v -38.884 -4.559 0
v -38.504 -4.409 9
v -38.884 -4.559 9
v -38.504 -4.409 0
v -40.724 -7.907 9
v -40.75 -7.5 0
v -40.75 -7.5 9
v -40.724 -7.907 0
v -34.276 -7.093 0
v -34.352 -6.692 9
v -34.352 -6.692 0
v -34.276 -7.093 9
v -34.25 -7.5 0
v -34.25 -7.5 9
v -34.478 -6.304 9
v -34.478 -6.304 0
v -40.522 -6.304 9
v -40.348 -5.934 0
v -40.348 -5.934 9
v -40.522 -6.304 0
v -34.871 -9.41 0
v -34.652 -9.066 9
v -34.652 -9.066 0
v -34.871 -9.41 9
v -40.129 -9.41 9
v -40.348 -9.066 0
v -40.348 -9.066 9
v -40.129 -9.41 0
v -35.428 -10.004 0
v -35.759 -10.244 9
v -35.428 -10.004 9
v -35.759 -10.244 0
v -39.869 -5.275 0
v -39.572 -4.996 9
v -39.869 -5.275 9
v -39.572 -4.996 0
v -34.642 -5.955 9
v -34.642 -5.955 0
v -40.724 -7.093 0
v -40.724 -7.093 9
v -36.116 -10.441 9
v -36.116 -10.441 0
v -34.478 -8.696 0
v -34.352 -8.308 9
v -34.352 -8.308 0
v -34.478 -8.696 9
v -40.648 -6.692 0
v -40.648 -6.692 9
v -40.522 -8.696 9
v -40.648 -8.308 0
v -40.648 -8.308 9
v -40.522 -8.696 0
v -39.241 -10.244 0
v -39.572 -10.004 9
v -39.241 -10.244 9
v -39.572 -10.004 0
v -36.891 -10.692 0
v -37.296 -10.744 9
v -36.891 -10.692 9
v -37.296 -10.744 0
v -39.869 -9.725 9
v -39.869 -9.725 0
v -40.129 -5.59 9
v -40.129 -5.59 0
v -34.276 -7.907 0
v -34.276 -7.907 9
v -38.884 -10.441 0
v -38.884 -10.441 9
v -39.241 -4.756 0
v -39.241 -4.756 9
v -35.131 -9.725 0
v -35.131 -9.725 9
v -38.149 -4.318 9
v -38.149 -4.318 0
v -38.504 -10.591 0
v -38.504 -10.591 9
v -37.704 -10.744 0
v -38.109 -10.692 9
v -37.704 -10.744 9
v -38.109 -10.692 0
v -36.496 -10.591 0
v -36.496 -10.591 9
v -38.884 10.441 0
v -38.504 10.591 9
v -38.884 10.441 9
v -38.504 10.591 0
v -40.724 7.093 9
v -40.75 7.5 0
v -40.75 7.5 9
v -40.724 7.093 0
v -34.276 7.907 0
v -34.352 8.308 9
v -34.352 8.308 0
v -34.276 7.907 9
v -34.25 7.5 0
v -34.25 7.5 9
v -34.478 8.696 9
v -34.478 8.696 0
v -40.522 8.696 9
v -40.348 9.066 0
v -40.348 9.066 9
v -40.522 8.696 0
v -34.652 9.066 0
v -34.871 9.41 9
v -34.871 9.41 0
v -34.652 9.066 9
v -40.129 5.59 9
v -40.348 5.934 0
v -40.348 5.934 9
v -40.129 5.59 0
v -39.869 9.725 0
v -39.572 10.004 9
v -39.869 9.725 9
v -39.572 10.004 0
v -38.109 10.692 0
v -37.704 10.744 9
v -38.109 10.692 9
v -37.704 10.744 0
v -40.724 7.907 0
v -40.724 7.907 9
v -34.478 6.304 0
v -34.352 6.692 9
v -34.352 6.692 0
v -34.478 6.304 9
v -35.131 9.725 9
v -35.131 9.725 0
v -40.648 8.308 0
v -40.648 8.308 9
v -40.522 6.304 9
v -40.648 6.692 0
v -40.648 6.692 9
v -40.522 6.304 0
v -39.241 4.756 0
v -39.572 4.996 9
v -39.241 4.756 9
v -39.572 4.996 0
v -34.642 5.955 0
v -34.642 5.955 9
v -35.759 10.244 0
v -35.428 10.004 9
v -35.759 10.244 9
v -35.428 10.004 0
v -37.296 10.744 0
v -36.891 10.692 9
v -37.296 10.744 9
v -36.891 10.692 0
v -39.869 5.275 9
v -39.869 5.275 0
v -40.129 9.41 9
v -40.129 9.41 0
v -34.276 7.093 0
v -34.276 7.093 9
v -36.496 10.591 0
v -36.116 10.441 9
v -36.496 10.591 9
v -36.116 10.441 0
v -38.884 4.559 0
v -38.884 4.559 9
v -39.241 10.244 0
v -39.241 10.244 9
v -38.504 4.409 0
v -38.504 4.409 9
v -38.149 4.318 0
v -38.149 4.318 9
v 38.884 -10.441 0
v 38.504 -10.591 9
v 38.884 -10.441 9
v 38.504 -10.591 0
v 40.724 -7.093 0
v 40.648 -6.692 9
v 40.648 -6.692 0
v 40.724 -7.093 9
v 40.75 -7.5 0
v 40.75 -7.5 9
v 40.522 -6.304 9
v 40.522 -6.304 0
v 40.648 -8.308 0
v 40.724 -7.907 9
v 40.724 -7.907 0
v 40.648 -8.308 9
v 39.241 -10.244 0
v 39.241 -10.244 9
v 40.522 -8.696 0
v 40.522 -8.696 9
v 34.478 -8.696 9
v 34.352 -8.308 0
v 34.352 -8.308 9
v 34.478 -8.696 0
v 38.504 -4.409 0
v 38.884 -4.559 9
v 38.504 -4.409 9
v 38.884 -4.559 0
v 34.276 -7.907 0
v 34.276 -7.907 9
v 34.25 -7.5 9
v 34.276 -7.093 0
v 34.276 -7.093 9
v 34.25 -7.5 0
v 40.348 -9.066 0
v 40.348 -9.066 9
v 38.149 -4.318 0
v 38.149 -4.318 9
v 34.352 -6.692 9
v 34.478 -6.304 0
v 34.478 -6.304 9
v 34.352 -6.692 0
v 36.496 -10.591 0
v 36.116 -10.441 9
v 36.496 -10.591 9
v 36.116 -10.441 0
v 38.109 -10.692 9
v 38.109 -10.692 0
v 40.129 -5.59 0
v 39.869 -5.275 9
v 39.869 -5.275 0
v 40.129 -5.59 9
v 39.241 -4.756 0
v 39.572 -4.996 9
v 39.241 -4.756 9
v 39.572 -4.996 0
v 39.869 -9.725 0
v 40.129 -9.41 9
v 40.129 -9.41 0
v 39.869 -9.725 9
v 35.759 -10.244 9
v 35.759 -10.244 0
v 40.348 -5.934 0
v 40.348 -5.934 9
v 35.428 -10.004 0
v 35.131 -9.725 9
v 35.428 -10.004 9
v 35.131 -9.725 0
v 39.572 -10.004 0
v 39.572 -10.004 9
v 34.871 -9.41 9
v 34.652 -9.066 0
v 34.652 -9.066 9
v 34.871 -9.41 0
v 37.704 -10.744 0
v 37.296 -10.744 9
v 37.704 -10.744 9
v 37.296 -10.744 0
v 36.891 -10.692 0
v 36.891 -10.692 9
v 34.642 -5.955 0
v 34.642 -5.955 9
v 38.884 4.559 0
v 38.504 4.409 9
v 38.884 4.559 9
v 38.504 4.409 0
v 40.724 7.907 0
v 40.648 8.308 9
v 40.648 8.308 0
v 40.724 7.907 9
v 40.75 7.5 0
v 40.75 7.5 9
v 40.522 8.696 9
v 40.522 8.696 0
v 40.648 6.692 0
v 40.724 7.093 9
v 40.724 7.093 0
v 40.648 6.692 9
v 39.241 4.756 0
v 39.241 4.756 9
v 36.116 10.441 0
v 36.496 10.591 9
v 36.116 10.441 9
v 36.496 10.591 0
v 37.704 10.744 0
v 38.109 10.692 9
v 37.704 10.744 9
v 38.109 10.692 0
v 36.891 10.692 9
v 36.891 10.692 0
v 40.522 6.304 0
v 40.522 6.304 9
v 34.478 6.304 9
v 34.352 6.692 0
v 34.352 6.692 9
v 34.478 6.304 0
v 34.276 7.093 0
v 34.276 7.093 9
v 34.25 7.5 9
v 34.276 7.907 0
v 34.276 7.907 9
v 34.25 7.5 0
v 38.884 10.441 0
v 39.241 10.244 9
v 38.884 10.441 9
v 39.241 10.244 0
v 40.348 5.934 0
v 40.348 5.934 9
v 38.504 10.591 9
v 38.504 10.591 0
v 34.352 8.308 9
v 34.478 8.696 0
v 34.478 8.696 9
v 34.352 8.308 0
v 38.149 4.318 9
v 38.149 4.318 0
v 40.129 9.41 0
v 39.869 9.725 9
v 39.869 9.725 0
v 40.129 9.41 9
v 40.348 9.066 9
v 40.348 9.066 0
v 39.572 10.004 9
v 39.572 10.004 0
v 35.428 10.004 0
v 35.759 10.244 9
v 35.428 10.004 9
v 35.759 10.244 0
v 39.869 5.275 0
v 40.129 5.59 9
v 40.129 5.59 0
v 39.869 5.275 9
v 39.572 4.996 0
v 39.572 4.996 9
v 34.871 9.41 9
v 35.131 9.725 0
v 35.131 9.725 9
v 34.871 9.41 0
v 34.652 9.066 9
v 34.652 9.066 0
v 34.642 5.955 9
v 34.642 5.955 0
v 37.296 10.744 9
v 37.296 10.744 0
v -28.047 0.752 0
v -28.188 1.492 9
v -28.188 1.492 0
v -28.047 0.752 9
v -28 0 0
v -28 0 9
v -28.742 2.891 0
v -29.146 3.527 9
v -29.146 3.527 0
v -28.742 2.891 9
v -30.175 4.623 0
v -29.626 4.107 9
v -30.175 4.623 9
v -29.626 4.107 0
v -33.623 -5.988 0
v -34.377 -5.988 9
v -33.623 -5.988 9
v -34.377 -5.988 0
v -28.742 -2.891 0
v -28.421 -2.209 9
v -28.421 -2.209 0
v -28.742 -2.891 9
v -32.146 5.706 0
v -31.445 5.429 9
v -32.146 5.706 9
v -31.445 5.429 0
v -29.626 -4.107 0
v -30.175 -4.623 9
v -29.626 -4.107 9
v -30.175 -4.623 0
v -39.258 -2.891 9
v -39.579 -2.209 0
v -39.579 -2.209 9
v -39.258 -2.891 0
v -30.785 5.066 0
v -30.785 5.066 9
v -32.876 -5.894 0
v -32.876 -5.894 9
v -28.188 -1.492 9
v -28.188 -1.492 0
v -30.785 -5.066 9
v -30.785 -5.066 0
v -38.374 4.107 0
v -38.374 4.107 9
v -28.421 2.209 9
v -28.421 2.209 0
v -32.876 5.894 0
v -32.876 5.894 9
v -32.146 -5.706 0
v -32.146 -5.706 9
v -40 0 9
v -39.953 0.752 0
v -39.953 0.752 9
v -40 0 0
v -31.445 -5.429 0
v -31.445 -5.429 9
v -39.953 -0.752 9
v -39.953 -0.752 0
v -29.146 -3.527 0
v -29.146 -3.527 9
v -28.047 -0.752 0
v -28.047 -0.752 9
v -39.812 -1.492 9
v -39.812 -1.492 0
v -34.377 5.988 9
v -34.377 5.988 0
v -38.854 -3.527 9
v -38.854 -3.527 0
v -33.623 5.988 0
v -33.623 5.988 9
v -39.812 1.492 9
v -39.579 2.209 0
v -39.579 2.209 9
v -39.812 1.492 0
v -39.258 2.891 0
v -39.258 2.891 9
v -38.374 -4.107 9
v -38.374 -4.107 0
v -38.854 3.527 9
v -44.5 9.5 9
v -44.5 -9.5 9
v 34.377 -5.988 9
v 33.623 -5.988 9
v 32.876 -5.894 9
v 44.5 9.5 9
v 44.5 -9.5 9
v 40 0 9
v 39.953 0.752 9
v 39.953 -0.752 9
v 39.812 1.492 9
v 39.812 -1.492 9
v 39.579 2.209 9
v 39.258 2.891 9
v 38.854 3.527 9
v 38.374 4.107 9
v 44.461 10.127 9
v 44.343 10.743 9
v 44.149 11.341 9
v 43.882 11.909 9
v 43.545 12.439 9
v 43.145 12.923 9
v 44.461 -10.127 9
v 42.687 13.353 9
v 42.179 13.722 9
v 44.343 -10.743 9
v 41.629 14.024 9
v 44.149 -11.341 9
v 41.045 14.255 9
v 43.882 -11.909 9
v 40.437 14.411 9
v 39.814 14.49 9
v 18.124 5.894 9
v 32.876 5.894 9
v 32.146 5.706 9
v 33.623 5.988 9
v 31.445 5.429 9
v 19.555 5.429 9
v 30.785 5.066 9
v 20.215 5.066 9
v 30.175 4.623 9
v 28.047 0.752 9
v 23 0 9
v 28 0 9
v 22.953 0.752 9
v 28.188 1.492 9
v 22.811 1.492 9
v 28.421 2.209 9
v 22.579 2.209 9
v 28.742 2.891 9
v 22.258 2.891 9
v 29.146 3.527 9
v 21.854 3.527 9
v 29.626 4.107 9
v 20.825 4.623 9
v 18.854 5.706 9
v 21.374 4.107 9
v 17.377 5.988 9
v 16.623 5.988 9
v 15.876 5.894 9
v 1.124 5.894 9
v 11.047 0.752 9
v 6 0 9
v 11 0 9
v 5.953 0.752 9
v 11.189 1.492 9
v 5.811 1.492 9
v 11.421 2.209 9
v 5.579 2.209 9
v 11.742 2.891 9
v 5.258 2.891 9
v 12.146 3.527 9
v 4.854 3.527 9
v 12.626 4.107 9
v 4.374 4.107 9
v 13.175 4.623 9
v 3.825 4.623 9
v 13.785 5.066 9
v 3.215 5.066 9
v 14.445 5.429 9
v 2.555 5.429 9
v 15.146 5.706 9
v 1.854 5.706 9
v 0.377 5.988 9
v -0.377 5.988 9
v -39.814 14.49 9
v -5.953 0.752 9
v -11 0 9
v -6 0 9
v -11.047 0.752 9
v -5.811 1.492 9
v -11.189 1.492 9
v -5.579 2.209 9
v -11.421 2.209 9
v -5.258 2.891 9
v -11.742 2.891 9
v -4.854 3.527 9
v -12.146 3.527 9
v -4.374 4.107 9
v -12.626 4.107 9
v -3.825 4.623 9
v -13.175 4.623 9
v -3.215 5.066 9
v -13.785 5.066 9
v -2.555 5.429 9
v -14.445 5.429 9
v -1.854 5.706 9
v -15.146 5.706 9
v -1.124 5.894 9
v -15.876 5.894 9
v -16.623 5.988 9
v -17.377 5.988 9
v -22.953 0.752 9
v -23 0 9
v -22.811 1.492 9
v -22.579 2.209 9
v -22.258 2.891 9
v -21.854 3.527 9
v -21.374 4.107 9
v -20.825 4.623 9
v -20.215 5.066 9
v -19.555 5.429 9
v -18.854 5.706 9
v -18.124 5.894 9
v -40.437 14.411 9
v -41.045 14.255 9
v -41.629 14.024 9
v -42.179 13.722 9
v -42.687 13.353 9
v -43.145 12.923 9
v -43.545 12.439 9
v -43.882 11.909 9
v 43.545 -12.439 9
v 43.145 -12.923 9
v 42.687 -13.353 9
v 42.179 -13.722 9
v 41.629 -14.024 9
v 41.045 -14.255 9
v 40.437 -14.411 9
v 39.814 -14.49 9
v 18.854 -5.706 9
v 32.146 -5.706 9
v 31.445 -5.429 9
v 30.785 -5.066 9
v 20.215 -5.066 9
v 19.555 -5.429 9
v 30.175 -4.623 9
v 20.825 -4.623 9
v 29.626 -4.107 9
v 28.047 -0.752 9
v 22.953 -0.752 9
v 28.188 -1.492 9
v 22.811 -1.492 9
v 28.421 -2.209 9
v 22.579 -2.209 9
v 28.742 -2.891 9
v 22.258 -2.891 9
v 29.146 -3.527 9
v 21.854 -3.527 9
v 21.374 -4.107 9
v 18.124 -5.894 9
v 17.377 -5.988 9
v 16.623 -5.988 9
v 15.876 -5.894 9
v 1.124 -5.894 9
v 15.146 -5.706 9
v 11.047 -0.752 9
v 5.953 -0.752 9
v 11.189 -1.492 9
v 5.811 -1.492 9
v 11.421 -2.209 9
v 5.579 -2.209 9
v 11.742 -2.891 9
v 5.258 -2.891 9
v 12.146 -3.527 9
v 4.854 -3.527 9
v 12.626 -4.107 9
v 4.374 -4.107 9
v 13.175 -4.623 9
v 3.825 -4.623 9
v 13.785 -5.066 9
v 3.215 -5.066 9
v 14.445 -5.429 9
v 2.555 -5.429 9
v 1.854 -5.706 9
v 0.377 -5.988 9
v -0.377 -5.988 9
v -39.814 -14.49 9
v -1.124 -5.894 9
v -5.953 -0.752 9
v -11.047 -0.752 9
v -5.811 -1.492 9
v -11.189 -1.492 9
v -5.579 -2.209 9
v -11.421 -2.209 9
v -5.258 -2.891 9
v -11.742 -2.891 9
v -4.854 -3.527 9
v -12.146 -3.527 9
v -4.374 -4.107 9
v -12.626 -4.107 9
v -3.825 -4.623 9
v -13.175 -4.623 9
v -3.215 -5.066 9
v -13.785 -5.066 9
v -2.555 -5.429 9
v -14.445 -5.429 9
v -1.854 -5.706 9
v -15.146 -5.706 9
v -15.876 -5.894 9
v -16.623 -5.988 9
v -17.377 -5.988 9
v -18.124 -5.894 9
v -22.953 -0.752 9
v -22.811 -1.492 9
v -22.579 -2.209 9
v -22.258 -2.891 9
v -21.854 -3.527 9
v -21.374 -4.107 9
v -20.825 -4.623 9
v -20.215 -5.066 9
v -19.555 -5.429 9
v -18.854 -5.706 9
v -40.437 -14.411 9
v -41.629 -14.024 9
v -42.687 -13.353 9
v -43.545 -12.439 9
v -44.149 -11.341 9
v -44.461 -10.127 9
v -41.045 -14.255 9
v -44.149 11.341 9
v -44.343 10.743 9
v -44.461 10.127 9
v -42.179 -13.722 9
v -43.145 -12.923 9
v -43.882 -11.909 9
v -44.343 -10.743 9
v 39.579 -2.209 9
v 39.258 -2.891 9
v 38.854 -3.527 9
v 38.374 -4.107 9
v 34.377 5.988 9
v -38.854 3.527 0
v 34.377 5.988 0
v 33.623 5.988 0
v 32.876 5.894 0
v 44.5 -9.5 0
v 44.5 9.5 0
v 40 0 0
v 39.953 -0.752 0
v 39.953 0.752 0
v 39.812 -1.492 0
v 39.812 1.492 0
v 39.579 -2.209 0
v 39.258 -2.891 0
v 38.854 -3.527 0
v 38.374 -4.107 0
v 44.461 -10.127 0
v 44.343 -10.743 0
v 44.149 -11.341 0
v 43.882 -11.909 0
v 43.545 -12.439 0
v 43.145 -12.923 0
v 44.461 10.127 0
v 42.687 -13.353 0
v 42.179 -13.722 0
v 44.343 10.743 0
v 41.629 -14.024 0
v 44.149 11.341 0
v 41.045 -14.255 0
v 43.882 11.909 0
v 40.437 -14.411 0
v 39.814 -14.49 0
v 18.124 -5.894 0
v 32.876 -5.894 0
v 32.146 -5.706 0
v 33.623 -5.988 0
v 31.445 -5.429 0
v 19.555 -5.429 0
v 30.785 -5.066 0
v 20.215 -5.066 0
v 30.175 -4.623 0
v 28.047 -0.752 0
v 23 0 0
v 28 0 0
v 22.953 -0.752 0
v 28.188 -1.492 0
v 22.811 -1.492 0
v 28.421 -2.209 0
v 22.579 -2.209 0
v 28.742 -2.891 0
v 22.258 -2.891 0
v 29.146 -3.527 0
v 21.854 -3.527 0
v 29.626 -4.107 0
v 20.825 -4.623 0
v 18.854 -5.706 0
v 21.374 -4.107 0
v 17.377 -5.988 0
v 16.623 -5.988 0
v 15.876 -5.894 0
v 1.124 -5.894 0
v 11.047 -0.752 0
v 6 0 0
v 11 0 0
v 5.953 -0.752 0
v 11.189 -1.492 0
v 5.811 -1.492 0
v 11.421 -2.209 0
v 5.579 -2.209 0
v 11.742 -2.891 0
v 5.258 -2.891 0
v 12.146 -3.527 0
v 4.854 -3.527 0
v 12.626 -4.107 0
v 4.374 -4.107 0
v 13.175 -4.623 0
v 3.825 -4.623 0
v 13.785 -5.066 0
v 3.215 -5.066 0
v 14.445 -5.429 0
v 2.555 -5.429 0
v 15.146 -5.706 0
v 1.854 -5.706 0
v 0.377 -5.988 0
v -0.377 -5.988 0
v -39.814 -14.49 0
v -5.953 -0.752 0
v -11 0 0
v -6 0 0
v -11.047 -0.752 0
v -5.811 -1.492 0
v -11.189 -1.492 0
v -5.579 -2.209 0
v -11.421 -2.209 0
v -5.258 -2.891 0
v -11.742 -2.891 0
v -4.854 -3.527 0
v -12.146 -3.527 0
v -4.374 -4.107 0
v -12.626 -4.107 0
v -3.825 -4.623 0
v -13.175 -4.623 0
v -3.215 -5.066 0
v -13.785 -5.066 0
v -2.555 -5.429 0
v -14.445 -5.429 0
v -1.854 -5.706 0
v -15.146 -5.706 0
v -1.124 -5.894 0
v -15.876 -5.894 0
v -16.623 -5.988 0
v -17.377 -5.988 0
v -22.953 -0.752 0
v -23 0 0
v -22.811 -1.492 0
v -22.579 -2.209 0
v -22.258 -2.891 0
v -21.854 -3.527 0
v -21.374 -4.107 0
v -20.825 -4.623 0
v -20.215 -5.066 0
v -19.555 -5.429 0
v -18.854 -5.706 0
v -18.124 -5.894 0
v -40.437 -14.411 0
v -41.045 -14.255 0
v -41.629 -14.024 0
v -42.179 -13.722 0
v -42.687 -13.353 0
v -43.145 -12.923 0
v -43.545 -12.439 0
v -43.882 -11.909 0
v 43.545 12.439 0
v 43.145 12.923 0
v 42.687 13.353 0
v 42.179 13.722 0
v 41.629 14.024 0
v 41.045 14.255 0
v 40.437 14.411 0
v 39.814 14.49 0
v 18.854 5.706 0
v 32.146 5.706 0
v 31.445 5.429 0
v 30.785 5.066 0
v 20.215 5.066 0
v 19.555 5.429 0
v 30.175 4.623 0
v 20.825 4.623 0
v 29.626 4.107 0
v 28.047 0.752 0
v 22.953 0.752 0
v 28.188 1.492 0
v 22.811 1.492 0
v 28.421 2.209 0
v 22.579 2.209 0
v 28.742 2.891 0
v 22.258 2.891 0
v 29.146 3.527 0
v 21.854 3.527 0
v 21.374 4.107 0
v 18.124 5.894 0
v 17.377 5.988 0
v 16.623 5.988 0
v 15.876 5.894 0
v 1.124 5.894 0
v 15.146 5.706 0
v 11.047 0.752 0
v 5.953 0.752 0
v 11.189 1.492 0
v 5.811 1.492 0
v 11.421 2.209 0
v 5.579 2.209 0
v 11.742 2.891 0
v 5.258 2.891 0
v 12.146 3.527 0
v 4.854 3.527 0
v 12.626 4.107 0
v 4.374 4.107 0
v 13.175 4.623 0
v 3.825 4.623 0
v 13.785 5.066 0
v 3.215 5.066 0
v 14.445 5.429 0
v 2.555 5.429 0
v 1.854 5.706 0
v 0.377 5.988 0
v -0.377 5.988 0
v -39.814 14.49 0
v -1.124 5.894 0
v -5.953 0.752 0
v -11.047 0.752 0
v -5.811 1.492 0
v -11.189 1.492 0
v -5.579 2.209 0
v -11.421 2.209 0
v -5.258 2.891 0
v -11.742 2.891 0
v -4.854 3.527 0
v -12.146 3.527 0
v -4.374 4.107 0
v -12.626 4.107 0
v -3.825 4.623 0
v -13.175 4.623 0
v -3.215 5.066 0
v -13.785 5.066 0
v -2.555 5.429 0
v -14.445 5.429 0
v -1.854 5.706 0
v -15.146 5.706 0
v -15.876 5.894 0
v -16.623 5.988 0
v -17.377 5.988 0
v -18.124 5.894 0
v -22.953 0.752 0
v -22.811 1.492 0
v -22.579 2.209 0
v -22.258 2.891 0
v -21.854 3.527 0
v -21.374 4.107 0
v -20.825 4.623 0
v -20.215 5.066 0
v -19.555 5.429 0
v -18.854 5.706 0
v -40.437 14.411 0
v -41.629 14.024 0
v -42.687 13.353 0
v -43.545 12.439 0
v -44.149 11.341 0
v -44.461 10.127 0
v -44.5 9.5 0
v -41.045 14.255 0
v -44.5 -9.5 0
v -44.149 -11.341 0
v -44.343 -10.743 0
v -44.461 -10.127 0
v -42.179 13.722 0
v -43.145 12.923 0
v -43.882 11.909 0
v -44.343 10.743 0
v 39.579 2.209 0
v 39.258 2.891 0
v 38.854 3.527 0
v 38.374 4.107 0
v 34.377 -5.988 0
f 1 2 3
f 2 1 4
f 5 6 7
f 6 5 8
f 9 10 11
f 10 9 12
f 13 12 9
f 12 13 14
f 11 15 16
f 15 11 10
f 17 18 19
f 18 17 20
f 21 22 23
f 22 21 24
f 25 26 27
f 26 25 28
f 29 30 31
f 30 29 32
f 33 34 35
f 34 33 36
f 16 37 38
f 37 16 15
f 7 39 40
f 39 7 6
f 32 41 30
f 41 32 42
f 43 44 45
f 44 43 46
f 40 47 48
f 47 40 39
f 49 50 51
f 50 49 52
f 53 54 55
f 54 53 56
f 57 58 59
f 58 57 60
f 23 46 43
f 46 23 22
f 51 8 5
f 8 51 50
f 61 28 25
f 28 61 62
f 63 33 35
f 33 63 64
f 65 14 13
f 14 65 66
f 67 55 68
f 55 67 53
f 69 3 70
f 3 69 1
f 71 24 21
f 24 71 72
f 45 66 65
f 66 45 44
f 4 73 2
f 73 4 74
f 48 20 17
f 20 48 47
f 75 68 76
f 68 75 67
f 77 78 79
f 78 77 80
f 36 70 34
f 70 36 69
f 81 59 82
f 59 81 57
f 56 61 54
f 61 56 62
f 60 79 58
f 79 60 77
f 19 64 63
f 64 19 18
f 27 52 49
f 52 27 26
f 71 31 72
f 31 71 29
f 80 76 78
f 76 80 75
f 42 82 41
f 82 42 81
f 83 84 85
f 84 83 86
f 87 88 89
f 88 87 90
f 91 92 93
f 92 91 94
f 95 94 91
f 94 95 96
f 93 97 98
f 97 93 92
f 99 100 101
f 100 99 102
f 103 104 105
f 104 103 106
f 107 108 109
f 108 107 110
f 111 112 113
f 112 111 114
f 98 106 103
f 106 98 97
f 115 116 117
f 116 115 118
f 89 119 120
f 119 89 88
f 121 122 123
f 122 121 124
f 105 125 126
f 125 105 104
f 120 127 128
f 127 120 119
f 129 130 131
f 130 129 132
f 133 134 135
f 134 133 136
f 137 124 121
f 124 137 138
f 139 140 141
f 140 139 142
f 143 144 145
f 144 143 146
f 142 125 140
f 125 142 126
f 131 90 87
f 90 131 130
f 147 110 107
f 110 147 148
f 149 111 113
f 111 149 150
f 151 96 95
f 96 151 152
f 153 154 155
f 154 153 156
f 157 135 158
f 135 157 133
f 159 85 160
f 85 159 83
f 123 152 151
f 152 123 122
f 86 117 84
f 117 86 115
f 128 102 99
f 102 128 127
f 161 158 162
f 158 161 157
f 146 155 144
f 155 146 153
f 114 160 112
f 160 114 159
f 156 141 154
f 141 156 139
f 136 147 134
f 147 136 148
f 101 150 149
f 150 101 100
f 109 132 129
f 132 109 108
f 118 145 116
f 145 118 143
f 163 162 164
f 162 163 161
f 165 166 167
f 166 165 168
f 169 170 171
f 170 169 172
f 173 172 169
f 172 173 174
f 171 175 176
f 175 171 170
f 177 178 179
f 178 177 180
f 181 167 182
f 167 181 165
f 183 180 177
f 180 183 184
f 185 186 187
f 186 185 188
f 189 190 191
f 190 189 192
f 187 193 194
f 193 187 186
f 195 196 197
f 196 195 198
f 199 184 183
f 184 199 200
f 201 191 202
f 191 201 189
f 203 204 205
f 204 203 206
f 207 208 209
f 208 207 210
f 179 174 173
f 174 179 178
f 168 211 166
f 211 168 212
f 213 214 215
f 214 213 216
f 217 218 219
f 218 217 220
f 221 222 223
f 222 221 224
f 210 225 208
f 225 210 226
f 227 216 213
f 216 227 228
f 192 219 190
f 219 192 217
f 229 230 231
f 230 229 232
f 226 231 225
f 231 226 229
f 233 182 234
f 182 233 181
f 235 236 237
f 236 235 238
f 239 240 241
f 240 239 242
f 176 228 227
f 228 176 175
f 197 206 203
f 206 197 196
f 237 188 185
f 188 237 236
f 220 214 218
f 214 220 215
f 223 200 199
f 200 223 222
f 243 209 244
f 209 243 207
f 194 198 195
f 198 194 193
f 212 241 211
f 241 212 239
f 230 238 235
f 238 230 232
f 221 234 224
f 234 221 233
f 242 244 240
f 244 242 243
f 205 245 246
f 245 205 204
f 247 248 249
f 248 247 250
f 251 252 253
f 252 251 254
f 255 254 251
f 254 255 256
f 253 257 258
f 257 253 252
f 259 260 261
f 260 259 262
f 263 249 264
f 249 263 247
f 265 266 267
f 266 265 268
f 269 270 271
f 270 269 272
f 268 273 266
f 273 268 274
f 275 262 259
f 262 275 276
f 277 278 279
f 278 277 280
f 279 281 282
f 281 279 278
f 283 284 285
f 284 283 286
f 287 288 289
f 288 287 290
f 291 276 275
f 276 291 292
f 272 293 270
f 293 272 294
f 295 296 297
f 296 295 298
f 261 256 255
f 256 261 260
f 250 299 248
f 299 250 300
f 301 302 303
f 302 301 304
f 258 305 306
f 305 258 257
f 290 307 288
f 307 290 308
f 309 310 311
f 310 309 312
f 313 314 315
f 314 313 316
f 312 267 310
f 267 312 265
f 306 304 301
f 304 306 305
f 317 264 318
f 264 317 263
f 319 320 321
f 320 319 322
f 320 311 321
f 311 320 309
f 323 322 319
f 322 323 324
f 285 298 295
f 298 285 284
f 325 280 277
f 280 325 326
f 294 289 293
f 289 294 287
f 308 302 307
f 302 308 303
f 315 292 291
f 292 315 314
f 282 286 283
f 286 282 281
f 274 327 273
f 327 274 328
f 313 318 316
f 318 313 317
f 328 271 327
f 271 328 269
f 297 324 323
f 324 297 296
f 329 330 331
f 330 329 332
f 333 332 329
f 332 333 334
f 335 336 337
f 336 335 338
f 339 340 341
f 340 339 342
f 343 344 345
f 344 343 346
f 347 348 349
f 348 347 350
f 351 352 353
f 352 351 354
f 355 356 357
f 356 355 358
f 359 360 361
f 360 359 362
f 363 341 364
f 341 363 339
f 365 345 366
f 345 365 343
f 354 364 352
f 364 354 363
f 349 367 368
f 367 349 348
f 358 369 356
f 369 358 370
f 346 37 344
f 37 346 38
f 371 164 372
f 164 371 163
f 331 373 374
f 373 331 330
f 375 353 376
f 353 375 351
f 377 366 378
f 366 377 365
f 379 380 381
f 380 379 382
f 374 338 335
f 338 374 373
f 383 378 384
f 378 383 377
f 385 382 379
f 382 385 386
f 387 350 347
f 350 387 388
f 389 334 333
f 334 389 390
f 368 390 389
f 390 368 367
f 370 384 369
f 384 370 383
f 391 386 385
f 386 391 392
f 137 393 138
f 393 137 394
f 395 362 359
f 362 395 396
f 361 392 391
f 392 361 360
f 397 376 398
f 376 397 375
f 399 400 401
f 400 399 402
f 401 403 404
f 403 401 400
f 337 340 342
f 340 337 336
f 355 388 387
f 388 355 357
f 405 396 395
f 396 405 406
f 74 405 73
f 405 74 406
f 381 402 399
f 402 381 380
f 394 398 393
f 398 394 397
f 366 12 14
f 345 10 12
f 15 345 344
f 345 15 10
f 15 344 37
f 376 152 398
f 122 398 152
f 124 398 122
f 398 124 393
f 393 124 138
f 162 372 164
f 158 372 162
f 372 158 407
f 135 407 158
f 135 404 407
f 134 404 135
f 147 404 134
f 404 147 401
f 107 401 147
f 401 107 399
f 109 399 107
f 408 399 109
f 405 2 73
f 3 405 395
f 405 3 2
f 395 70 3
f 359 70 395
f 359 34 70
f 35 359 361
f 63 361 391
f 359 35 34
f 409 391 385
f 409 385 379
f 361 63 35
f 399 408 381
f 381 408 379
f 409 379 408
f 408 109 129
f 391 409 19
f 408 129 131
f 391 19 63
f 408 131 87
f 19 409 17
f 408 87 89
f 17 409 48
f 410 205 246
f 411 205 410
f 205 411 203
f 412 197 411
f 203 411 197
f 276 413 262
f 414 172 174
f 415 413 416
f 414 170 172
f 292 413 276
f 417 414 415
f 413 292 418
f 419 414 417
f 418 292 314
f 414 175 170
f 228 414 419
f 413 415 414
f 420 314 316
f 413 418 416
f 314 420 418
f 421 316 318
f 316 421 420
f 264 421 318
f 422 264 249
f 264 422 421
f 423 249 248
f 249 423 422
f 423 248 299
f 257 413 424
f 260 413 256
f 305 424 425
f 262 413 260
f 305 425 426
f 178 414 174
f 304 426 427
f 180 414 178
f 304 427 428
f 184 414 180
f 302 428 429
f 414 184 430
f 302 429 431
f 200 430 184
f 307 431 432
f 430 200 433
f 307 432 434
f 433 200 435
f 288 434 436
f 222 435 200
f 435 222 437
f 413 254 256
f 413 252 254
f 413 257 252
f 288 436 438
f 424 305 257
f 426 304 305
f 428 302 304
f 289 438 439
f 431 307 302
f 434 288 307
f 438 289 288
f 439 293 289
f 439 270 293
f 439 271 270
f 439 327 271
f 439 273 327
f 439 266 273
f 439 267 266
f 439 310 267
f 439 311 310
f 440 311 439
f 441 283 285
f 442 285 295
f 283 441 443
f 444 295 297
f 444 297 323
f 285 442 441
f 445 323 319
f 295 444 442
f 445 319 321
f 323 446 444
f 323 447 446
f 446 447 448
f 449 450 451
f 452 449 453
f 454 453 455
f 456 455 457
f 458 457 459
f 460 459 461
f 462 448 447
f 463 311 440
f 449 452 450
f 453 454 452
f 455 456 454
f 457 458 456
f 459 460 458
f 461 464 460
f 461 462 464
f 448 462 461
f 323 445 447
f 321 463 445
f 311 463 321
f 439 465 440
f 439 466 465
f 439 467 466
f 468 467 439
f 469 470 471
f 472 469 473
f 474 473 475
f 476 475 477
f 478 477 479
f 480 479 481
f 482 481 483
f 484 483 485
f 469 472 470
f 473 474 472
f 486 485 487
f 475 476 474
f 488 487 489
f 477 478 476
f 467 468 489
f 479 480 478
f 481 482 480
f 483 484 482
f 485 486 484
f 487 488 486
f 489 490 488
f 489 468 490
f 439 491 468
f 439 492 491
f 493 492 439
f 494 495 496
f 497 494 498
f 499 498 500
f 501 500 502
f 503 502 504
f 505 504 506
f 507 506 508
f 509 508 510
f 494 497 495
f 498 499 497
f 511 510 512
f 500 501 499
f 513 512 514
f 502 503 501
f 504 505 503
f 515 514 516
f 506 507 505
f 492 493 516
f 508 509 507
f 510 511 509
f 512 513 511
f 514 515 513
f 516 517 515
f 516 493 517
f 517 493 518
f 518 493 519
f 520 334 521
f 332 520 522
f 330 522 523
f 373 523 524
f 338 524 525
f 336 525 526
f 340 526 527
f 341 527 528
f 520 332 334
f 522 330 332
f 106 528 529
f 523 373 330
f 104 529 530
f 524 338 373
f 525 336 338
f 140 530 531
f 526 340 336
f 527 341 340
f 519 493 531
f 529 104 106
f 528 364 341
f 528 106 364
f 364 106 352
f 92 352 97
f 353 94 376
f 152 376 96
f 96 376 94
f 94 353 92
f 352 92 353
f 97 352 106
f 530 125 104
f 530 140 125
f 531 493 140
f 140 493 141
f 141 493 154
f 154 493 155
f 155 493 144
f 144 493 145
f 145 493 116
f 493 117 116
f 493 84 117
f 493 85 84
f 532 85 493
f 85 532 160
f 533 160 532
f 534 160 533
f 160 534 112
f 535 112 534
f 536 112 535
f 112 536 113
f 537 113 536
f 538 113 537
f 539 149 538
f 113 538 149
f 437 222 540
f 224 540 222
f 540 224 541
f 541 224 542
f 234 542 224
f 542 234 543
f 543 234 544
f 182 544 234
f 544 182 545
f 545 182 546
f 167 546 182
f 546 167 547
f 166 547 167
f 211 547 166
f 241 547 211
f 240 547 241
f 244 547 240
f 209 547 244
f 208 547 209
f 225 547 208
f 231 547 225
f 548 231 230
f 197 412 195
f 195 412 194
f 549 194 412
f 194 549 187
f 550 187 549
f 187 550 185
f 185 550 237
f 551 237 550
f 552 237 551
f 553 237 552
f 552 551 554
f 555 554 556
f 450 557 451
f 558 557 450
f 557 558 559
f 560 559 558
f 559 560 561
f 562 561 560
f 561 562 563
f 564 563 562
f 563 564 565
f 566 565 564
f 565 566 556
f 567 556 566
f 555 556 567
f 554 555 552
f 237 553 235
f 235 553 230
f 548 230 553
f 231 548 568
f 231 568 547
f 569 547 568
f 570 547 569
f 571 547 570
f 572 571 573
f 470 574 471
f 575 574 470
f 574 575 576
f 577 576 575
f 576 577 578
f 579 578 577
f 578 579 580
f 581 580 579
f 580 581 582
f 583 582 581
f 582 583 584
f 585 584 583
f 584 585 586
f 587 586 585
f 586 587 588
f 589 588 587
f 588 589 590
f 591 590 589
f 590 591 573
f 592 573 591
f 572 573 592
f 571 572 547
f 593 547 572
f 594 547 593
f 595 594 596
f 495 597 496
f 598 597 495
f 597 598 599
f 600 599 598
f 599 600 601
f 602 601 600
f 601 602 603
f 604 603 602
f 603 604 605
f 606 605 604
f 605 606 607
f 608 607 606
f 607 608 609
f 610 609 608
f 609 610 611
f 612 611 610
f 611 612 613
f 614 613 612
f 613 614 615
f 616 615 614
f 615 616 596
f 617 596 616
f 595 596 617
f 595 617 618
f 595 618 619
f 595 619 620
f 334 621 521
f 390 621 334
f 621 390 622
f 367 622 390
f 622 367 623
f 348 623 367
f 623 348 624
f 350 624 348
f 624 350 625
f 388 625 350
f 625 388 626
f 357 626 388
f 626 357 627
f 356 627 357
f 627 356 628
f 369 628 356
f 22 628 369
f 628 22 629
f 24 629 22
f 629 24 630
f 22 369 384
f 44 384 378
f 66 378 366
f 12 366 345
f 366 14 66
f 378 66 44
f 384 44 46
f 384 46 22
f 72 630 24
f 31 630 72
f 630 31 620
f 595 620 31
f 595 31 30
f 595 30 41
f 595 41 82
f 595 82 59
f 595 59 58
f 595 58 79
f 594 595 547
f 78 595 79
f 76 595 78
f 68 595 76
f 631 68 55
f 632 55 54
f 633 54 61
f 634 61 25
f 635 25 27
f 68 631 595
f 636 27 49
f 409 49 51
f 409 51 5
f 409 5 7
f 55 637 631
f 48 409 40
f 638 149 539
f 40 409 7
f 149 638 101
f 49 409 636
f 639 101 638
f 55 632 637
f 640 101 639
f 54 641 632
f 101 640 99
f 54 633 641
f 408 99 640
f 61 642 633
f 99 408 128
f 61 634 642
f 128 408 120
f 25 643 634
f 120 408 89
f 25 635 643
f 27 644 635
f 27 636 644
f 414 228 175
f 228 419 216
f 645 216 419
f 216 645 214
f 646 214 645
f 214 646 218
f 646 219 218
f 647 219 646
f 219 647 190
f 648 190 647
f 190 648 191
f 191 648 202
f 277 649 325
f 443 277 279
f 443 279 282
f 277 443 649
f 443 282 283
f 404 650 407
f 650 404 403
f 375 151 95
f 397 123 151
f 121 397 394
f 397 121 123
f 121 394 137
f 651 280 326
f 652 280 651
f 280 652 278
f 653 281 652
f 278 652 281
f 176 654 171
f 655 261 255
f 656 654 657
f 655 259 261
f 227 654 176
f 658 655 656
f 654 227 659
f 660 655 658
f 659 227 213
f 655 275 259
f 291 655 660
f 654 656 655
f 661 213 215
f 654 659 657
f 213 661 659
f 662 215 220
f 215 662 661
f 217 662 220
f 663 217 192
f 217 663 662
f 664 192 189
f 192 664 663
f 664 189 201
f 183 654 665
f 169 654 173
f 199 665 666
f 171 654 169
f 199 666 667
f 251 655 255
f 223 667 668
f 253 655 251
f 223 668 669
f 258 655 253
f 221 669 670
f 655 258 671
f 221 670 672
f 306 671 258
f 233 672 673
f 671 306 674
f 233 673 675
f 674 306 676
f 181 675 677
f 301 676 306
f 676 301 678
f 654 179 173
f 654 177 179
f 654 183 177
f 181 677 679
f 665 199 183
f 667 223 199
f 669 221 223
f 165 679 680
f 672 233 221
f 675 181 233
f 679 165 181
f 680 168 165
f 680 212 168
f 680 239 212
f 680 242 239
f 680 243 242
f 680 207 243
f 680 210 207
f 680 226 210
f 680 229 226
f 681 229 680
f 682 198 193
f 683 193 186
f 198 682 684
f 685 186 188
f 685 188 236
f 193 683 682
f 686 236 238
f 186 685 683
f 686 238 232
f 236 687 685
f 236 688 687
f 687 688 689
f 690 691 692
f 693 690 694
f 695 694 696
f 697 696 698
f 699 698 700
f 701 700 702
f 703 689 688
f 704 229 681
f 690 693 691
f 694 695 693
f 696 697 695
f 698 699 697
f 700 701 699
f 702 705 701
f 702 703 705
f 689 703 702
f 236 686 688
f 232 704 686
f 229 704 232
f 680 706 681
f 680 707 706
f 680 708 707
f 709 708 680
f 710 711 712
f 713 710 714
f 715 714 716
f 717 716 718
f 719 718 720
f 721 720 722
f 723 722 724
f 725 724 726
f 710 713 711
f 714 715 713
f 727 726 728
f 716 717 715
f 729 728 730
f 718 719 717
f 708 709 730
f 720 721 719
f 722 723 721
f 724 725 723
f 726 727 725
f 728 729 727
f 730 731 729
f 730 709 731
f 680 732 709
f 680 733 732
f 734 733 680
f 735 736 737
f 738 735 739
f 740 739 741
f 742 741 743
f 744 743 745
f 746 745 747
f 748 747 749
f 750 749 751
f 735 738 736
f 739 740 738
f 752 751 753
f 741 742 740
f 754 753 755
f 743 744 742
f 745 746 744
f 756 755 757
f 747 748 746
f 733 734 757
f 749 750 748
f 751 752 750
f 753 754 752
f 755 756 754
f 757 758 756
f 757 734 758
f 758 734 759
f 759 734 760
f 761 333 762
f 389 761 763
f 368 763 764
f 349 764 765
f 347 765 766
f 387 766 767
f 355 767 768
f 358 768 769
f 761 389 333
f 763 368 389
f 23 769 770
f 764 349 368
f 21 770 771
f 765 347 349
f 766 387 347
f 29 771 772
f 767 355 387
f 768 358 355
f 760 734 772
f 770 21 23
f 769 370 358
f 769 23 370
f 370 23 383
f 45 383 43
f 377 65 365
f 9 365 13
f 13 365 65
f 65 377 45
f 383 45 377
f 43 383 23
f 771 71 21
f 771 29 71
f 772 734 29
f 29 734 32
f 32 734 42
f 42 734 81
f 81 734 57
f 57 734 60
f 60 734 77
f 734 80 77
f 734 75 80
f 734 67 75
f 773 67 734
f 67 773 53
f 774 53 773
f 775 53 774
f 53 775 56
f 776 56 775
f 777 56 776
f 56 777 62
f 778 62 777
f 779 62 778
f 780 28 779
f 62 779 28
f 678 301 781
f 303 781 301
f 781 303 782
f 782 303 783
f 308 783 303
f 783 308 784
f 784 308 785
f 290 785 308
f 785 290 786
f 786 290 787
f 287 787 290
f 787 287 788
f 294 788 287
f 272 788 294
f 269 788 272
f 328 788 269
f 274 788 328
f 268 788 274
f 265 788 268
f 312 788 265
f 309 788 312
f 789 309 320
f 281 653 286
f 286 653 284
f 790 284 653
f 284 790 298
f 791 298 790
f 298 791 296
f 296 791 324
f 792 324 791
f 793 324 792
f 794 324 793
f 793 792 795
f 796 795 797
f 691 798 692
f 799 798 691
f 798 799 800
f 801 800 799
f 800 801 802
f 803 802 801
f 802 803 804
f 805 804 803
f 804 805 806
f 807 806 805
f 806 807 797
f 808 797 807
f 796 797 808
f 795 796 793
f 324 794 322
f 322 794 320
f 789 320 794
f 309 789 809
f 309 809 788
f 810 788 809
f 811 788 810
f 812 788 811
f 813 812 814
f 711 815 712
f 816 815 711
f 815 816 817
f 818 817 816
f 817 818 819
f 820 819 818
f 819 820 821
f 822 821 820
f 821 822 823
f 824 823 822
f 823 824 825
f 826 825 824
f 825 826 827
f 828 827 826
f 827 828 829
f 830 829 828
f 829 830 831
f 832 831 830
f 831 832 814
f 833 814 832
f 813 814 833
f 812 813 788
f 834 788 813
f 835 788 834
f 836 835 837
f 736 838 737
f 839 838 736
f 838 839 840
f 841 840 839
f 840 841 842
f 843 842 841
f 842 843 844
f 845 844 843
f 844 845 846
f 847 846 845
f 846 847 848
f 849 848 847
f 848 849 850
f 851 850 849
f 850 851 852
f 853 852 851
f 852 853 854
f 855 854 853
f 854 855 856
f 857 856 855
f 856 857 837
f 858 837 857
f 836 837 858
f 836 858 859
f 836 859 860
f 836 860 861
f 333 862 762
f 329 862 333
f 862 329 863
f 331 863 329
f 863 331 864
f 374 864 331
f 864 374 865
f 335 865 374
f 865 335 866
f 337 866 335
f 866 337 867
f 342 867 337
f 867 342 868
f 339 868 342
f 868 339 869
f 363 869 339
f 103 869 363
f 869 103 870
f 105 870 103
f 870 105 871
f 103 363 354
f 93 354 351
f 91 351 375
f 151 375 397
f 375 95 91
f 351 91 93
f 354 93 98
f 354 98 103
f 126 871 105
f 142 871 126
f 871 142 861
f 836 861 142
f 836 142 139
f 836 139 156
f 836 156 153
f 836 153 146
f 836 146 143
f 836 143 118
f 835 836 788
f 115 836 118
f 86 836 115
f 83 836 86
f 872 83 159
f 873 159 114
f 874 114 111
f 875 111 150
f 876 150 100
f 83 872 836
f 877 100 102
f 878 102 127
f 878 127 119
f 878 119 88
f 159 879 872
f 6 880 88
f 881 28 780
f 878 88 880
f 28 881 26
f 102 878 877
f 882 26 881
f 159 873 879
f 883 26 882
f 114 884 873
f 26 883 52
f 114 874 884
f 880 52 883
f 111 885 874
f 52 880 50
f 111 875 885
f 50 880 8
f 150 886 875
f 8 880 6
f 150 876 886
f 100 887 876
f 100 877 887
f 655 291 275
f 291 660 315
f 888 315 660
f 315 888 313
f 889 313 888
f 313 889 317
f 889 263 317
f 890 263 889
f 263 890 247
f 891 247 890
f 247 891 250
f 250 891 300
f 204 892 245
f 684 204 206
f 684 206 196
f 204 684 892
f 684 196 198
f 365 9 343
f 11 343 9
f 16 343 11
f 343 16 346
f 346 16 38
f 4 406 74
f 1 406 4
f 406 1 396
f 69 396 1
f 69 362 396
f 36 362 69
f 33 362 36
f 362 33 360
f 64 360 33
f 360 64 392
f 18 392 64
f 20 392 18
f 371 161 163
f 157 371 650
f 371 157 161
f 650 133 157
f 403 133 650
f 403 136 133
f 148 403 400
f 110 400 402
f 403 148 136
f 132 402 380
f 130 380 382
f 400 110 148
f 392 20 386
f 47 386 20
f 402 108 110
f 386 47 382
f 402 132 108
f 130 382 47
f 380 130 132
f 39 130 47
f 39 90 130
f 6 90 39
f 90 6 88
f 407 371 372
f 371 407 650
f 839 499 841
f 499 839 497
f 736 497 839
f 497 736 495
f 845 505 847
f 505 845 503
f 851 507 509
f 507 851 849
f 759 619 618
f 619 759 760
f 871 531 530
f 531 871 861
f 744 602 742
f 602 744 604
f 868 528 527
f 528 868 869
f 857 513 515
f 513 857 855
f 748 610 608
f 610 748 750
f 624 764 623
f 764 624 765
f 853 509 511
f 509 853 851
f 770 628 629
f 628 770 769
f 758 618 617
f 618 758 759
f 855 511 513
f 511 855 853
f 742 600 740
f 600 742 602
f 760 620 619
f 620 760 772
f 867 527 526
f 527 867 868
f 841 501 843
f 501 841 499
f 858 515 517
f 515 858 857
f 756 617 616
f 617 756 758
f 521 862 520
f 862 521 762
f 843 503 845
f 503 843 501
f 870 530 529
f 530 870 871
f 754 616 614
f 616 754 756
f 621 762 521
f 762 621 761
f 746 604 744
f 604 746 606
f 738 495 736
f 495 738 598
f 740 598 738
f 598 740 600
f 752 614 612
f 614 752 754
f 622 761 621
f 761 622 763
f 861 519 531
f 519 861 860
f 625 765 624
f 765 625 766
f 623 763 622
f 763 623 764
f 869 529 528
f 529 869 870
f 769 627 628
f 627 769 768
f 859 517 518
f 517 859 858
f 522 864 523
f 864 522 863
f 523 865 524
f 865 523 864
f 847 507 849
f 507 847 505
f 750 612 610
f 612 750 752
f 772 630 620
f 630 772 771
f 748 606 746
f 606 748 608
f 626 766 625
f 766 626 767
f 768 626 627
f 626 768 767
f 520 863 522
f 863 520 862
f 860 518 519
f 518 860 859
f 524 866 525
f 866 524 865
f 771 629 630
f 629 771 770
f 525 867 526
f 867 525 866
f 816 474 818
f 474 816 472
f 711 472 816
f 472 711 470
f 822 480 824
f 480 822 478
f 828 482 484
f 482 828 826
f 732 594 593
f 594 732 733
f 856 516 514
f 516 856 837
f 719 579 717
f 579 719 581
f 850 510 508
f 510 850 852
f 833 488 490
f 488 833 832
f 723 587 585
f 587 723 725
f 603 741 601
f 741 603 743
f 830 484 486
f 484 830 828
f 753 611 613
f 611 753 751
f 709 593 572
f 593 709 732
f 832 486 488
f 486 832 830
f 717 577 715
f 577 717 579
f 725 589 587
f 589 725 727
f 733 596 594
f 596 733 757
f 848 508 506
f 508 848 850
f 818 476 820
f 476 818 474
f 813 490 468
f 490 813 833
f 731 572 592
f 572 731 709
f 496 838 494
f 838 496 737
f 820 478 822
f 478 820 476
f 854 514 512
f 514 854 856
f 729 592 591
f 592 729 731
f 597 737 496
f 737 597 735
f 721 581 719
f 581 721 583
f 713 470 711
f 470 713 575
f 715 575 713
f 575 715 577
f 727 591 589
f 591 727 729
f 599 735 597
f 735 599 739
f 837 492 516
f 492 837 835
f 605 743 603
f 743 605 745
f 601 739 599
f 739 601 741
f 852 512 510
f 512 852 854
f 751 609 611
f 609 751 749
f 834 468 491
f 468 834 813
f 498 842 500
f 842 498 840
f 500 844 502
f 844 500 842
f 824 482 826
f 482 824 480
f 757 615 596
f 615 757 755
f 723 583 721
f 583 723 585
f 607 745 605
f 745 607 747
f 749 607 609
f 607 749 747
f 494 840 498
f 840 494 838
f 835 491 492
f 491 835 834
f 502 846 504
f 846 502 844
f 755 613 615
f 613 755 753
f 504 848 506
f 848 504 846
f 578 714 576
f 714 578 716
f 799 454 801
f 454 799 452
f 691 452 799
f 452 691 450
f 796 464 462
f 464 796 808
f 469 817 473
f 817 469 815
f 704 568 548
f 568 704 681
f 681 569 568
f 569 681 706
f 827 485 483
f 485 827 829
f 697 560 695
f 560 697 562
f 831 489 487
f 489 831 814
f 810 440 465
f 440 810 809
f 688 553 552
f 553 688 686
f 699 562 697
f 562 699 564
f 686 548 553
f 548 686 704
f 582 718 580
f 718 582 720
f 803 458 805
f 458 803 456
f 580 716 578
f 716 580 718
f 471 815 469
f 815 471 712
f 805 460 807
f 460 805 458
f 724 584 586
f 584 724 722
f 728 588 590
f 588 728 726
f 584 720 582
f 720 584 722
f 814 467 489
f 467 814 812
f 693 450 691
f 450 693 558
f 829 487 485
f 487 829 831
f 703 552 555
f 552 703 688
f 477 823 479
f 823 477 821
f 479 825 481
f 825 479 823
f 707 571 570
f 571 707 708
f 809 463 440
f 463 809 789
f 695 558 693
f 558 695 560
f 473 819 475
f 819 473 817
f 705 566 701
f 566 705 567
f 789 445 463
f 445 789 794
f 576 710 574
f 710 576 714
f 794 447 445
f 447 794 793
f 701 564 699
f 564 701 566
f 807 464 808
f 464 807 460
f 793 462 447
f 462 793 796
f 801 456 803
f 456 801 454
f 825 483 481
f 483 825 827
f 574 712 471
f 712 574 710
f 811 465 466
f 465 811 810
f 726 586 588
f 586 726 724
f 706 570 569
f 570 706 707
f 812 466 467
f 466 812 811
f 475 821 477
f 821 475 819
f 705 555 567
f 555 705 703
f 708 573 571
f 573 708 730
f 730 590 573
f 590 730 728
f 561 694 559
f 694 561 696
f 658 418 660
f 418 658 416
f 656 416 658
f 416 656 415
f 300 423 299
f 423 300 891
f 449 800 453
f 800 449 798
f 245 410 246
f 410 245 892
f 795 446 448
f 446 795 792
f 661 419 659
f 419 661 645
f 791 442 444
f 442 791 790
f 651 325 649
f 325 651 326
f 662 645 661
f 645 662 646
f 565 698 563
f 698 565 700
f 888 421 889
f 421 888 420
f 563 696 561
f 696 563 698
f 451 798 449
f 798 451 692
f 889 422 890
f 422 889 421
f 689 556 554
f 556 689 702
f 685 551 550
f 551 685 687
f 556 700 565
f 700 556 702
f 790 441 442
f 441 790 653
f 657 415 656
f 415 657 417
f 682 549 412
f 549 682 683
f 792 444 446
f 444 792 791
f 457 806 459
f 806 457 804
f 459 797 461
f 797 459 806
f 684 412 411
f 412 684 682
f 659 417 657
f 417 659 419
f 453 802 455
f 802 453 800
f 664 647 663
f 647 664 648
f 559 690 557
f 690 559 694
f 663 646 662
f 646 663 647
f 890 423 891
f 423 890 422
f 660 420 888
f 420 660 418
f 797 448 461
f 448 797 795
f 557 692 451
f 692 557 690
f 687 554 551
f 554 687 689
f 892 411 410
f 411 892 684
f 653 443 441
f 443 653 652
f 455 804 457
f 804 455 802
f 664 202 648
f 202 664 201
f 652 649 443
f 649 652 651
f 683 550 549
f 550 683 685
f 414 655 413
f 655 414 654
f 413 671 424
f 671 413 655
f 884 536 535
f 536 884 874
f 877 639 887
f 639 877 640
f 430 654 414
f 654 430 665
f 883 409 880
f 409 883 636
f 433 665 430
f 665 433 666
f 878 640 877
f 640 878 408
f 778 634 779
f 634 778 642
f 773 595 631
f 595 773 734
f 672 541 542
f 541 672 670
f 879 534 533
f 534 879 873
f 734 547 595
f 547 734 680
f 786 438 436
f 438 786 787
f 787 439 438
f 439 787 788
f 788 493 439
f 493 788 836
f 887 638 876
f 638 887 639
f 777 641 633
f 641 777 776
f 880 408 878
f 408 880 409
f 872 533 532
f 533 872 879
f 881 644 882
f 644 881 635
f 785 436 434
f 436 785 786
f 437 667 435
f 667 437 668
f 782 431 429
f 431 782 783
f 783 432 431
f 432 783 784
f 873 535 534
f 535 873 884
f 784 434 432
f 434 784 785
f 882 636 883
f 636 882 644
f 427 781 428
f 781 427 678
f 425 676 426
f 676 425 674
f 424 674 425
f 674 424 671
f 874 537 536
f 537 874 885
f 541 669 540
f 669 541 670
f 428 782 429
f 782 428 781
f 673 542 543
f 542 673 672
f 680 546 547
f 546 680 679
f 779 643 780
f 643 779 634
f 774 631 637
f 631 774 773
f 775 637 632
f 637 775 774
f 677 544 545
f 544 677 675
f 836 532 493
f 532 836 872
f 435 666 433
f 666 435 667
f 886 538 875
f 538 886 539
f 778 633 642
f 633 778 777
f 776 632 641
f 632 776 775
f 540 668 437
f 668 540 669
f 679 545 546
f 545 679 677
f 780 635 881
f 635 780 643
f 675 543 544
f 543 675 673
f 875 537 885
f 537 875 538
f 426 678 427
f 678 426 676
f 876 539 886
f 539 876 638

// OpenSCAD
$fn = 50;


difference() {
	union() {
		hull() {
			translate(v = [-39.5000000000, 9.5000000000, 0]) {
				cylinder(h = 9, r = 5);
			}
			translate(v = [39.5000000000, 9.5000000000, 0]) {
				cylinder(h = 9, r = 5);
			}
			translate(v = [-39.5000000000, -9.5000000000, 0]) {
				cylinder(h = 9, r = 5);
			}
			translate(v = [39.5000000000, -9.5000000000, 0]) {
				cylinder(h = 9, r = 5);
			}
		}
	}
	union() {
		#translate(v = [-37.5000000000, -7.5000000000, -100.0000000000]) {
			cylinder(h = 200, r = 3.2500000000);
		}
		#translate(v = [-37.5000000000, 7.5000000000, -100.0000000000]) {
			cylinder(h = 200, r = 3.2500000000);
		}
		#translate(v = [37.5000000000, -7.5000000000, -100.0000000000]) {
			cylinder(h = 200, r = 3.2500000000);
		}
		#translate(v = [37.5000000000, 7.5000000000, -100.0000000000]) {
			cylinder(h = 200, r = 3.2500000000);
		}
		#translate(v = [-34.0000000000, 0, 0]) {
			cylinder(h = 9, r = 6.0000000000);
		}
		#translate(v = [-17.0000000000, 0, 0]) {
			cylinder(h = 9, r = 6.0000000000);
		}
		#cylinder(h = 9, r = 6.0000000000);
		#translate(v = [17.0000000000, 0, 0]) {
			cylinder(h = 9, r = 6.0000000000);
		}
		#translate(v = [34.0000000000, 0, 0]) {
			cylinder(h = 9, r = 6.0000000000);
		}
	}
}
